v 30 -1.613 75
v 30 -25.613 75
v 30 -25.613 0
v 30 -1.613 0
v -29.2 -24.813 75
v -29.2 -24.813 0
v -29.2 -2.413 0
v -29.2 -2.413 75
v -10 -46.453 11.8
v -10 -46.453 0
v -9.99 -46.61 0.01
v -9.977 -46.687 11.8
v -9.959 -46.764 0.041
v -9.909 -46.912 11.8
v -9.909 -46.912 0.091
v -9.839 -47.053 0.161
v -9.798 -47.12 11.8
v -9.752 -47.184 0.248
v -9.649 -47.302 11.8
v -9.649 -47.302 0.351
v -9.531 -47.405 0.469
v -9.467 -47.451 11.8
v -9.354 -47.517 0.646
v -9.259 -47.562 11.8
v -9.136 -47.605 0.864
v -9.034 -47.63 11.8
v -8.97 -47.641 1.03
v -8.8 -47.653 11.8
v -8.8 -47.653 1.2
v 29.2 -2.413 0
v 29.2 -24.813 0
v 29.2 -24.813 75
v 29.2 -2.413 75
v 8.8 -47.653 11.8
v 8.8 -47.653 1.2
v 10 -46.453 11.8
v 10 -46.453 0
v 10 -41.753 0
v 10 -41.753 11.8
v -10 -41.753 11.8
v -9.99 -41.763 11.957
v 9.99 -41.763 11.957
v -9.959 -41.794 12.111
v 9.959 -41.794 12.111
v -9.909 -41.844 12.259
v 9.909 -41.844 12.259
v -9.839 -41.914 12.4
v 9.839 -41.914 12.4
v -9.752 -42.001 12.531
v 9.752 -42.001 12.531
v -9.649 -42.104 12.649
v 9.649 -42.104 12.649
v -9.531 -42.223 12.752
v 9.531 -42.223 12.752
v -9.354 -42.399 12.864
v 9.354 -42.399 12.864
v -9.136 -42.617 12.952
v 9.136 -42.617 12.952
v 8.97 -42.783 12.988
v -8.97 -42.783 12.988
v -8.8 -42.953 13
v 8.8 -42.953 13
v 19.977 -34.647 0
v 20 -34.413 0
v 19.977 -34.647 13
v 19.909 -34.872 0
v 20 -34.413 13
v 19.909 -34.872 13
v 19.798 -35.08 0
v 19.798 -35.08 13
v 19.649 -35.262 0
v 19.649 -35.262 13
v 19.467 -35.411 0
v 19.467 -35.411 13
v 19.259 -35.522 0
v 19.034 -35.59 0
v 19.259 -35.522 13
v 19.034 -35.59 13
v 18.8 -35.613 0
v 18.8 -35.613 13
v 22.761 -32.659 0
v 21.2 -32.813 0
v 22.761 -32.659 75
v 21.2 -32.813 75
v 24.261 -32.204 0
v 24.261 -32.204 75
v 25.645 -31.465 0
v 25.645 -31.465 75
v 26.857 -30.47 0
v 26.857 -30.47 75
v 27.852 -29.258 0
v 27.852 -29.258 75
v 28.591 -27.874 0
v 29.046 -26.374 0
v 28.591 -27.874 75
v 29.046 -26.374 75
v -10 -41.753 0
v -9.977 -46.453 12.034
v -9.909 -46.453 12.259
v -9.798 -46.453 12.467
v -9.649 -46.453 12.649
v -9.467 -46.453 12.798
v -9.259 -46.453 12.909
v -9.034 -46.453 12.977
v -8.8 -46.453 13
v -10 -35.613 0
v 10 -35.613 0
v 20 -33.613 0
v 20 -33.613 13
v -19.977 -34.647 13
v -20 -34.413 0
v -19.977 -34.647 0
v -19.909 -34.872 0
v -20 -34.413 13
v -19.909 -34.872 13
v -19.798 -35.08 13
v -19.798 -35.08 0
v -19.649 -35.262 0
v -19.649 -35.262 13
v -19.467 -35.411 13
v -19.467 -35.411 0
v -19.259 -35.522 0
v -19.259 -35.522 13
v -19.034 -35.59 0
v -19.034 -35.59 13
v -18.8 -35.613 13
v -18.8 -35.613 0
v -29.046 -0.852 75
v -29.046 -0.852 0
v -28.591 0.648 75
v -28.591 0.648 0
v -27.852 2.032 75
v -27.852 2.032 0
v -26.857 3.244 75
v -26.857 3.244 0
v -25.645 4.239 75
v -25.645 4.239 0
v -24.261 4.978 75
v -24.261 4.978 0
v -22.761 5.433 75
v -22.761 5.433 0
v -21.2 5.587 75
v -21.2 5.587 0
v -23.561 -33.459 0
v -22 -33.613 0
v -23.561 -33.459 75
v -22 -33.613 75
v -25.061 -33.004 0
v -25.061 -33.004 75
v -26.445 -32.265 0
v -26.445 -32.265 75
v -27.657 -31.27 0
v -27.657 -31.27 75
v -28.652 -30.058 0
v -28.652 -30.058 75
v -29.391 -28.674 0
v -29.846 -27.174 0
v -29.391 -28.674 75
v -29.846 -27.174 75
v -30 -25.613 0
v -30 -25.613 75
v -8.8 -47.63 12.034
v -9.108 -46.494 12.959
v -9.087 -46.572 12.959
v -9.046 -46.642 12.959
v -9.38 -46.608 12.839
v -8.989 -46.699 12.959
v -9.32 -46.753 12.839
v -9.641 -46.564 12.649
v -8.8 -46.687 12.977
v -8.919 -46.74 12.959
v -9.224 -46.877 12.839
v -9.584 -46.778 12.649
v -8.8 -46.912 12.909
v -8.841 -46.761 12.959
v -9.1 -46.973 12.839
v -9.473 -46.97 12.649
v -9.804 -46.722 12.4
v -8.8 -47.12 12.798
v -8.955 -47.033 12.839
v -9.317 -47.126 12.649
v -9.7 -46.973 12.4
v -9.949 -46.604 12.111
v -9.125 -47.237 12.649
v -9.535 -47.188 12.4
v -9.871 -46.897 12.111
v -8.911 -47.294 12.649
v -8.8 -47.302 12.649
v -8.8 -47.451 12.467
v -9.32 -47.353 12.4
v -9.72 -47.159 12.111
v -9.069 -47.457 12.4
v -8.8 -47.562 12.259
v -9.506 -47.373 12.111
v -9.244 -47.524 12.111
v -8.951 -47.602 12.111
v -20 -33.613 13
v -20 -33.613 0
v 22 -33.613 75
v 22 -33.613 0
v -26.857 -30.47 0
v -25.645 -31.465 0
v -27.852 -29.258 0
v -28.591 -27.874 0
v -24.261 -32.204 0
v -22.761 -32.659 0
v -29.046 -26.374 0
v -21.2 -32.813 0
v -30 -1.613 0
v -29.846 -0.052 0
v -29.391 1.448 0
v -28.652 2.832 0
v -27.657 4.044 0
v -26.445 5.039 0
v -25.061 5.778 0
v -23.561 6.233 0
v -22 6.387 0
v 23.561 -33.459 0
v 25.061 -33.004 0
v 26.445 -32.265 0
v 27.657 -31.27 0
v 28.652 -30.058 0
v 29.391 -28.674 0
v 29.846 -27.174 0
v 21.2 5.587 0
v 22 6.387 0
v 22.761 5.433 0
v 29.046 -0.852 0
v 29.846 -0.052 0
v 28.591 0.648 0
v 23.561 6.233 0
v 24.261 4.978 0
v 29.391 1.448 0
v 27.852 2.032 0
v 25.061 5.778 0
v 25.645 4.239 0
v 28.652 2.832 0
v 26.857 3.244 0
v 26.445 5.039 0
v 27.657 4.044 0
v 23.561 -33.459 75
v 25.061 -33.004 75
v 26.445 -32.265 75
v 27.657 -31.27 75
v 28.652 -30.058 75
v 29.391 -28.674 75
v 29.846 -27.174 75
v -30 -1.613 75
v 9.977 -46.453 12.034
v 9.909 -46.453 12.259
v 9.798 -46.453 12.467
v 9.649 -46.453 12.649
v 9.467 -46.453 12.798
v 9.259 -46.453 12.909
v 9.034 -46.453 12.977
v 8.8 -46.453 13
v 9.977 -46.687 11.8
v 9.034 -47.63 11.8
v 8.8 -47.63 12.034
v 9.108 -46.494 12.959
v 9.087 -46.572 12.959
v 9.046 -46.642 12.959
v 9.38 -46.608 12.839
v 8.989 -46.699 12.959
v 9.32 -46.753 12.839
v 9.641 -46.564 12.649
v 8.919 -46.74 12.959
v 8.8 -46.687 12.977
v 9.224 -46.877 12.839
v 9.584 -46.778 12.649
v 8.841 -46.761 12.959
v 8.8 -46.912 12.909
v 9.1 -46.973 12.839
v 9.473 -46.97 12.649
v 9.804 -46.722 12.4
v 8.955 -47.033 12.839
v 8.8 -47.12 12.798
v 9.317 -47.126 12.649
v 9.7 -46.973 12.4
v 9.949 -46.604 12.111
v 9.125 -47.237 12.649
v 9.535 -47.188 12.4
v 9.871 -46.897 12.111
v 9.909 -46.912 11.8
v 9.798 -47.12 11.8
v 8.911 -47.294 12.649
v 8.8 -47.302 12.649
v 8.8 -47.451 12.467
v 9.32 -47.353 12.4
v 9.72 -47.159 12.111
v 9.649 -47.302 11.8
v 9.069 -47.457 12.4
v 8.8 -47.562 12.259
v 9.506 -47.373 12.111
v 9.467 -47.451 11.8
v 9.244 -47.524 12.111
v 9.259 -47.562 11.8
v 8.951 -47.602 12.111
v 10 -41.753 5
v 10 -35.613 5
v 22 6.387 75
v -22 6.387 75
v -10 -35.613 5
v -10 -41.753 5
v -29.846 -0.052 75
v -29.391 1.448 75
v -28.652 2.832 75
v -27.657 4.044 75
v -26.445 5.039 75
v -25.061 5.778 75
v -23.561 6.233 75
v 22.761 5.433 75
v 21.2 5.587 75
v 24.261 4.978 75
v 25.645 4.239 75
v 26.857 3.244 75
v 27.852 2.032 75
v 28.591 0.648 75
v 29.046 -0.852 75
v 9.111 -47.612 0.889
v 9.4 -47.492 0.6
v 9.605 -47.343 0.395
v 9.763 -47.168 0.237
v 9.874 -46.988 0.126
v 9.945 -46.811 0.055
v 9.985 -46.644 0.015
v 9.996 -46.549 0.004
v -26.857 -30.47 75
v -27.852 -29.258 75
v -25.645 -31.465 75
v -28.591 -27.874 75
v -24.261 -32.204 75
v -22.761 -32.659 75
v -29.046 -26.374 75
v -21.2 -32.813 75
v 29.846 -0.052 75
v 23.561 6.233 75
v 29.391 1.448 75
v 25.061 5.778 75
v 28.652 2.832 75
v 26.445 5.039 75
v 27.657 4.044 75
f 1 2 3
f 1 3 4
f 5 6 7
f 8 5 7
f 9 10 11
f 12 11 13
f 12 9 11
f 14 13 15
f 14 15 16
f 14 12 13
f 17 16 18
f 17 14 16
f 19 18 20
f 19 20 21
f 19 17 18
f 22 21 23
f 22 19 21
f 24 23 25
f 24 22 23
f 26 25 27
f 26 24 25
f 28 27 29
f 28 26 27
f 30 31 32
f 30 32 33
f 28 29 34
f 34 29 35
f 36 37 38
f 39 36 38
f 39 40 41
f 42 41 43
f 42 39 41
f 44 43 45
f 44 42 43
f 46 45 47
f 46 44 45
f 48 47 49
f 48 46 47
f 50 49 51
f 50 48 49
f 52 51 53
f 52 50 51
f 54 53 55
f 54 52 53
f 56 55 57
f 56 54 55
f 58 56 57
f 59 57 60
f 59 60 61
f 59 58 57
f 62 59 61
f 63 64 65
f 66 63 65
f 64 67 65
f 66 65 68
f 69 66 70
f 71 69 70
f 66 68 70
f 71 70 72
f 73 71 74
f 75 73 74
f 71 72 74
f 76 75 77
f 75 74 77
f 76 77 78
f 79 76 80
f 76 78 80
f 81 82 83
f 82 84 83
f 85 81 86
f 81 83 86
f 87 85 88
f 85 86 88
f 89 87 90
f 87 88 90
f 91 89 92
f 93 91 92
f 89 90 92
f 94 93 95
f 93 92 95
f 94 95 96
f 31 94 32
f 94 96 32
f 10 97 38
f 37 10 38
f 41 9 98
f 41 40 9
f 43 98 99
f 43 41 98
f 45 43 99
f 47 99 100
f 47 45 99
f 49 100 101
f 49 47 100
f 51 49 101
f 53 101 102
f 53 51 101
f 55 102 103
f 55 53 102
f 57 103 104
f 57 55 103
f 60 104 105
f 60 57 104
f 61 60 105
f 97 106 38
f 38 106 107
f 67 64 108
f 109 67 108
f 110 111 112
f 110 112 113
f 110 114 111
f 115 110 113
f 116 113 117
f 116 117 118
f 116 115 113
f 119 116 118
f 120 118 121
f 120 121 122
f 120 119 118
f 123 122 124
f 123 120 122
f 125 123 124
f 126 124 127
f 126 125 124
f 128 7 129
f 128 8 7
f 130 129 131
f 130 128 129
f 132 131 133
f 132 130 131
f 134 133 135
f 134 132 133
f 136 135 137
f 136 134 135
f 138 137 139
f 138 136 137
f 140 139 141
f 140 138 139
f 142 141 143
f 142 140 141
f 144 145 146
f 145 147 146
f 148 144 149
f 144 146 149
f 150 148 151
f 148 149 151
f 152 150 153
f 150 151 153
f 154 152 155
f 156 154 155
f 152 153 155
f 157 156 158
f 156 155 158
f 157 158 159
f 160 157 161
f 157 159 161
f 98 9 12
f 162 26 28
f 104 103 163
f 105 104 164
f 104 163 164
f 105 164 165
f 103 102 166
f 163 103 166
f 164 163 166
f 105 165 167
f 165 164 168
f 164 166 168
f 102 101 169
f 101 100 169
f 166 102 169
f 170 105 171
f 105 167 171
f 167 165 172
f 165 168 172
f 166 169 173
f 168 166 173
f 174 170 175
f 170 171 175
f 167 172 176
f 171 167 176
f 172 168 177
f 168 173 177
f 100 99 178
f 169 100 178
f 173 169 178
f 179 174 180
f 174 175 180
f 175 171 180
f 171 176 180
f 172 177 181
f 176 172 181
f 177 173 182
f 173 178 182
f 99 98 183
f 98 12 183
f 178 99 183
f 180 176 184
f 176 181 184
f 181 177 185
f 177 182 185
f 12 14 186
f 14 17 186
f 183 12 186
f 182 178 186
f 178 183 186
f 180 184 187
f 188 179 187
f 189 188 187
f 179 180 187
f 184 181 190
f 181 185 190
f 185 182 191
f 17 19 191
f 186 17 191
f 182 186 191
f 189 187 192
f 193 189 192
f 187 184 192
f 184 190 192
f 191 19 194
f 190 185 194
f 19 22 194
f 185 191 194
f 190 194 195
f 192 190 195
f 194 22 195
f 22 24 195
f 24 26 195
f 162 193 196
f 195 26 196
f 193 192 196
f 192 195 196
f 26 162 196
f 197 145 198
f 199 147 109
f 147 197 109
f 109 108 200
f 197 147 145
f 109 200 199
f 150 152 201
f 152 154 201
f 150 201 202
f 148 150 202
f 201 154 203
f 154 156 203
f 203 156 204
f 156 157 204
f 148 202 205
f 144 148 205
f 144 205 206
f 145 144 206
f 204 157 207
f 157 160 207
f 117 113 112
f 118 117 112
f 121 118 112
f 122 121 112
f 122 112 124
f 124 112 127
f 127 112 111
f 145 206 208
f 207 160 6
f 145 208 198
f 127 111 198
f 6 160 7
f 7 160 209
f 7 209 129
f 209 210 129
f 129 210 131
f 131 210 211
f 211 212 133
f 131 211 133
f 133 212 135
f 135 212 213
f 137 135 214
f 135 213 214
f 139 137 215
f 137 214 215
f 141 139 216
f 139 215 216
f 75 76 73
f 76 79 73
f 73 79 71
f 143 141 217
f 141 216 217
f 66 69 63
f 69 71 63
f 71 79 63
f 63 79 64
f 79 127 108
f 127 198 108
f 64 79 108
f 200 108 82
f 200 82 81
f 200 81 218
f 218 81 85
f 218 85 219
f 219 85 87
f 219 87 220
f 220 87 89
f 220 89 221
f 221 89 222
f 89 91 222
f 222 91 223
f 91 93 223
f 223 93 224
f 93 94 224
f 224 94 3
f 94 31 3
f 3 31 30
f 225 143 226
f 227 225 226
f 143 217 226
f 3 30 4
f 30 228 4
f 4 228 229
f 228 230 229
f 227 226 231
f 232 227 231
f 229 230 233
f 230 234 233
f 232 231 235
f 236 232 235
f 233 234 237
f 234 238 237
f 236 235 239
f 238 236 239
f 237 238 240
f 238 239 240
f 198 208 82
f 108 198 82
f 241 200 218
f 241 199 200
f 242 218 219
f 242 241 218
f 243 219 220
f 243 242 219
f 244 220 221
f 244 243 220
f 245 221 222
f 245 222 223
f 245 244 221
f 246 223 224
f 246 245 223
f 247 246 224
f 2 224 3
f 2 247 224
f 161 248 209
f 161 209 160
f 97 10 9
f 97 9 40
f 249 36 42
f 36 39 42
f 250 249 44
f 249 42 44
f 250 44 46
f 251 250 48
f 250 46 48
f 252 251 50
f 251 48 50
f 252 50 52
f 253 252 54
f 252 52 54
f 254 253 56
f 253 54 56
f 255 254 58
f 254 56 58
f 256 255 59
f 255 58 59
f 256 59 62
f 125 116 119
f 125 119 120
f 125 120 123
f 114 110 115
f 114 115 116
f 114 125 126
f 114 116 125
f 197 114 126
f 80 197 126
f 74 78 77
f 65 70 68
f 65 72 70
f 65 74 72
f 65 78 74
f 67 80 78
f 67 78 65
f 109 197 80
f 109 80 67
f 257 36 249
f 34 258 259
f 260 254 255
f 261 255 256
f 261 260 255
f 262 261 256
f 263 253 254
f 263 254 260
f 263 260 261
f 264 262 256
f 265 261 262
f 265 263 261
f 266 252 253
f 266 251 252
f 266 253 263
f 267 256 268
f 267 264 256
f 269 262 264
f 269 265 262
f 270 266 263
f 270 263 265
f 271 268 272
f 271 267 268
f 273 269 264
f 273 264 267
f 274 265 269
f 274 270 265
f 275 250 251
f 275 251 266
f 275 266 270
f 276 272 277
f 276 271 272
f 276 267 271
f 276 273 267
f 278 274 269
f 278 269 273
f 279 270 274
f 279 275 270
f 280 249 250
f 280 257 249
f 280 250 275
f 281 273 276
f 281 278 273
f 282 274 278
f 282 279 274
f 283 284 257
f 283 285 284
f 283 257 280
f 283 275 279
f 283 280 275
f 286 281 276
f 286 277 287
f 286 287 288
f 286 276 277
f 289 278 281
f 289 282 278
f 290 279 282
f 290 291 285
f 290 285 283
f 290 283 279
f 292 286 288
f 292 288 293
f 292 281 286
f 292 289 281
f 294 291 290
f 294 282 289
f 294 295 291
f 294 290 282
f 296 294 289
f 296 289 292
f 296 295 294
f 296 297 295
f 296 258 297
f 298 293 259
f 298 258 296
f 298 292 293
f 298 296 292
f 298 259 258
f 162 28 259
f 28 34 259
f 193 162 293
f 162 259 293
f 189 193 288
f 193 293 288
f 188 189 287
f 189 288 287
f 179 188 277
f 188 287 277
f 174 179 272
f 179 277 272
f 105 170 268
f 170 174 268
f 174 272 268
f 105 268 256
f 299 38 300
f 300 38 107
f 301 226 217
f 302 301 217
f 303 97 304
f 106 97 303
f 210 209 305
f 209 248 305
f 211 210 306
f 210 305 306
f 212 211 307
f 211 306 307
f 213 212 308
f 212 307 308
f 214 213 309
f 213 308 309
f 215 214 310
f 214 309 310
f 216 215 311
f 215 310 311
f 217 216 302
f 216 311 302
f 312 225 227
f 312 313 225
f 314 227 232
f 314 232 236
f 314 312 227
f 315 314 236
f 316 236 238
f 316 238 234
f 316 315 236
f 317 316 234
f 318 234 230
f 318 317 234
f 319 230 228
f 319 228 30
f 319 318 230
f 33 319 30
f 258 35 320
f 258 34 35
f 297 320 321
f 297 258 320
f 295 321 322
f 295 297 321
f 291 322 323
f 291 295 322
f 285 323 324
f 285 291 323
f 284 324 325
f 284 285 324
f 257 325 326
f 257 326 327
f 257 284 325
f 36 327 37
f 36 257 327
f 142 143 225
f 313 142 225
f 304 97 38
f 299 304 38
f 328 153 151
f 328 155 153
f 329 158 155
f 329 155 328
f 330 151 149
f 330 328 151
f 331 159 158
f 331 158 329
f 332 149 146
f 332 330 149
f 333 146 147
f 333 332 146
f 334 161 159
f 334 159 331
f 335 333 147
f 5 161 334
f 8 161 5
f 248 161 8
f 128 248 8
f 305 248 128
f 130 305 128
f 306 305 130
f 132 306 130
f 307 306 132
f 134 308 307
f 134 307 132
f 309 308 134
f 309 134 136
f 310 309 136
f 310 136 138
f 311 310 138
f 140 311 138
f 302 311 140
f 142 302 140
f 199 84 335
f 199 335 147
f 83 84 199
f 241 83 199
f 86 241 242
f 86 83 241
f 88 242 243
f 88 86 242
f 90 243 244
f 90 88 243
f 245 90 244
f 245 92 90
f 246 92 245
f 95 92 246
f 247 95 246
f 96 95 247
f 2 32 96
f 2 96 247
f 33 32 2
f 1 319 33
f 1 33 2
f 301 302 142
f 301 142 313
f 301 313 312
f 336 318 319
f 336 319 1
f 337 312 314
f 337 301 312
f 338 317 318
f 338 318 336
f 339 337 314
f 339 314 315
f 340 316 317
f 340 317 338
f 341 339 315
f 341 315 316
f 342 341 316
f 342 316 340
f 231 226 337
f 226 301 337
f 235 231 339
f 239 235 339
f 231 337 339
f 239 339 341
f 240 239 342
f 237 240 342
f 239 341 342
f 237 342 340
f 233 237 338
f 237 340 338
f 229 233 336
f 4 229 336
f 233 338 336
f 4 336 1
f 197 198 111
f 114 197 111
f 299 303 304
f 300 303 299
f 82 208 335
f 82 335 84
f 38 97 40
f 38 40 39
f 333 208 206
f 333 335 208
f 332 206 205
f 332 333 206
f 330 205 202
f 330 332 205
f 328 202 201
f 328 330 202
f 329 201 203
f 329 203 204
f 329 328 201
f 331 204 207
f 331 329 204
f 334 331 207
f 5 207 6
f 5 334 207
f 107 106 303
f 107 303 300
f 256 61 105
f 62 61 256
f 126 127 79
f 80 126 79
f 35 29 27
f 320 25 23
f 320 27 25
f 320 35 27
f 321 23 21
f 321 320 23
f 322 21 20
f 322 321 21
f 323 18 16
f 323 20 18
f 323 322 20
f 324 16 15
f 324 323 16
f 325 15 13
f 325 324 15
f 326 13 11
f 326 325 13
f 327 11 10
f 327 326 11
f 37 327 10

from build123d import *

# Parameters (mm, degrees)
F0_W     = 20
F0_H     = 5.9
F1_DEPTH = 13
F0_H_2   = 6.14
F2_DEPTH = 5
F0_W_2   = 58.4
F0_H_3   = 38.4
F3_DEPTH = 75
F4_R     = 1.2
F4_2_R   = 1.2
F5_R     = 8


with BuildPart() as f1:
    # F0 (on Top) → F1 (new body)
    with BuildSketch(Plane.XY):
        with Locations((0, -44.7030205363)):
            Rectangle(F0_W, F0_H)
    extrude(amount=F1_DEPTH)

    # F4
    f4_edges = [f1.edges().sort_by_distance(p)[0] for p in [
        (10, -47.653021, 6.5),
        (-10, -47.653021, 6.5),
        (10, -44.703021, 13),
        (0, -41.753021, 13),
        (-10, -44.703021, 13),
        (0, -47.653021, 13),
        (0, -47.653021, 0),
    ]]
    fillet(f4_edges, radius=F4_R)


with BuildPart() as f1b:
    # F0 (on Top) → F1, piece 2 (new body)
    with BuildSketch(Plane.XY):
        Polygon((20, -35.6130205363), (20, -33.6130205363), (-20, -33.6130205363), (-20, -35.6130205363), (-10, -35.6130205363), (10, -35.6130205363), align=None)
    extrude(amount=F1_DEPTH)

    # F0 (on Top) → F3 (join)
    with BuildSketch(Plane.XY):
        Polygon((20, -33.6130205363), (30, -33.6130205363), (30, 6.3869794637), (-30, 6.3869794637), (-30, -33.6130205363), (-20, -33.6130205363), align=None)
        with Locations((0, -13.6130205363)):
            Rectangle(F0_W_2, F0_H_3, mode=Mode.SUBTRACT)
    extrude(amount=F3_DEPTH)

    # F4#2
    f4_2_edges = [f1b.edges().sort_by_distance(p)[0] for p in [
        (20, -35.613021, 6.5),
        (-20, -35.613021, 6.5),
    ]]
    fillet(f4_2_edges, radius=F4_2_R)

    # F5
    f5_edges = [f1b.edges().sort_by_distance(p)[0] for p in [
        (29.2, 5.586979, 37.5),
        (29.2, -32.813021, 37.5),
        (-29.2, -32.813021, 37.5),
        (-29.2, 5.586979, 37.5),
        (-30, -33.613021, 37.5),
        (-30, 6.386979, 37.5),
        (30, -33.613021, 37.5),
        (30, 6.386979, 37.5),
    ]]
    fillet(f5_edges, radius=F5_R)


with BuildPart() as f2:
    # F0 (on Top) → F2 (new body)
    with BuildSketch(Plane.XY):
        with Locations((0, -38.6830205363)):
            Rectangle(F0_W, F0_H_2)
    extrude(amount=F2_DEPTH)


solid = Compound([f1.part, f1b.part, f2.part])
